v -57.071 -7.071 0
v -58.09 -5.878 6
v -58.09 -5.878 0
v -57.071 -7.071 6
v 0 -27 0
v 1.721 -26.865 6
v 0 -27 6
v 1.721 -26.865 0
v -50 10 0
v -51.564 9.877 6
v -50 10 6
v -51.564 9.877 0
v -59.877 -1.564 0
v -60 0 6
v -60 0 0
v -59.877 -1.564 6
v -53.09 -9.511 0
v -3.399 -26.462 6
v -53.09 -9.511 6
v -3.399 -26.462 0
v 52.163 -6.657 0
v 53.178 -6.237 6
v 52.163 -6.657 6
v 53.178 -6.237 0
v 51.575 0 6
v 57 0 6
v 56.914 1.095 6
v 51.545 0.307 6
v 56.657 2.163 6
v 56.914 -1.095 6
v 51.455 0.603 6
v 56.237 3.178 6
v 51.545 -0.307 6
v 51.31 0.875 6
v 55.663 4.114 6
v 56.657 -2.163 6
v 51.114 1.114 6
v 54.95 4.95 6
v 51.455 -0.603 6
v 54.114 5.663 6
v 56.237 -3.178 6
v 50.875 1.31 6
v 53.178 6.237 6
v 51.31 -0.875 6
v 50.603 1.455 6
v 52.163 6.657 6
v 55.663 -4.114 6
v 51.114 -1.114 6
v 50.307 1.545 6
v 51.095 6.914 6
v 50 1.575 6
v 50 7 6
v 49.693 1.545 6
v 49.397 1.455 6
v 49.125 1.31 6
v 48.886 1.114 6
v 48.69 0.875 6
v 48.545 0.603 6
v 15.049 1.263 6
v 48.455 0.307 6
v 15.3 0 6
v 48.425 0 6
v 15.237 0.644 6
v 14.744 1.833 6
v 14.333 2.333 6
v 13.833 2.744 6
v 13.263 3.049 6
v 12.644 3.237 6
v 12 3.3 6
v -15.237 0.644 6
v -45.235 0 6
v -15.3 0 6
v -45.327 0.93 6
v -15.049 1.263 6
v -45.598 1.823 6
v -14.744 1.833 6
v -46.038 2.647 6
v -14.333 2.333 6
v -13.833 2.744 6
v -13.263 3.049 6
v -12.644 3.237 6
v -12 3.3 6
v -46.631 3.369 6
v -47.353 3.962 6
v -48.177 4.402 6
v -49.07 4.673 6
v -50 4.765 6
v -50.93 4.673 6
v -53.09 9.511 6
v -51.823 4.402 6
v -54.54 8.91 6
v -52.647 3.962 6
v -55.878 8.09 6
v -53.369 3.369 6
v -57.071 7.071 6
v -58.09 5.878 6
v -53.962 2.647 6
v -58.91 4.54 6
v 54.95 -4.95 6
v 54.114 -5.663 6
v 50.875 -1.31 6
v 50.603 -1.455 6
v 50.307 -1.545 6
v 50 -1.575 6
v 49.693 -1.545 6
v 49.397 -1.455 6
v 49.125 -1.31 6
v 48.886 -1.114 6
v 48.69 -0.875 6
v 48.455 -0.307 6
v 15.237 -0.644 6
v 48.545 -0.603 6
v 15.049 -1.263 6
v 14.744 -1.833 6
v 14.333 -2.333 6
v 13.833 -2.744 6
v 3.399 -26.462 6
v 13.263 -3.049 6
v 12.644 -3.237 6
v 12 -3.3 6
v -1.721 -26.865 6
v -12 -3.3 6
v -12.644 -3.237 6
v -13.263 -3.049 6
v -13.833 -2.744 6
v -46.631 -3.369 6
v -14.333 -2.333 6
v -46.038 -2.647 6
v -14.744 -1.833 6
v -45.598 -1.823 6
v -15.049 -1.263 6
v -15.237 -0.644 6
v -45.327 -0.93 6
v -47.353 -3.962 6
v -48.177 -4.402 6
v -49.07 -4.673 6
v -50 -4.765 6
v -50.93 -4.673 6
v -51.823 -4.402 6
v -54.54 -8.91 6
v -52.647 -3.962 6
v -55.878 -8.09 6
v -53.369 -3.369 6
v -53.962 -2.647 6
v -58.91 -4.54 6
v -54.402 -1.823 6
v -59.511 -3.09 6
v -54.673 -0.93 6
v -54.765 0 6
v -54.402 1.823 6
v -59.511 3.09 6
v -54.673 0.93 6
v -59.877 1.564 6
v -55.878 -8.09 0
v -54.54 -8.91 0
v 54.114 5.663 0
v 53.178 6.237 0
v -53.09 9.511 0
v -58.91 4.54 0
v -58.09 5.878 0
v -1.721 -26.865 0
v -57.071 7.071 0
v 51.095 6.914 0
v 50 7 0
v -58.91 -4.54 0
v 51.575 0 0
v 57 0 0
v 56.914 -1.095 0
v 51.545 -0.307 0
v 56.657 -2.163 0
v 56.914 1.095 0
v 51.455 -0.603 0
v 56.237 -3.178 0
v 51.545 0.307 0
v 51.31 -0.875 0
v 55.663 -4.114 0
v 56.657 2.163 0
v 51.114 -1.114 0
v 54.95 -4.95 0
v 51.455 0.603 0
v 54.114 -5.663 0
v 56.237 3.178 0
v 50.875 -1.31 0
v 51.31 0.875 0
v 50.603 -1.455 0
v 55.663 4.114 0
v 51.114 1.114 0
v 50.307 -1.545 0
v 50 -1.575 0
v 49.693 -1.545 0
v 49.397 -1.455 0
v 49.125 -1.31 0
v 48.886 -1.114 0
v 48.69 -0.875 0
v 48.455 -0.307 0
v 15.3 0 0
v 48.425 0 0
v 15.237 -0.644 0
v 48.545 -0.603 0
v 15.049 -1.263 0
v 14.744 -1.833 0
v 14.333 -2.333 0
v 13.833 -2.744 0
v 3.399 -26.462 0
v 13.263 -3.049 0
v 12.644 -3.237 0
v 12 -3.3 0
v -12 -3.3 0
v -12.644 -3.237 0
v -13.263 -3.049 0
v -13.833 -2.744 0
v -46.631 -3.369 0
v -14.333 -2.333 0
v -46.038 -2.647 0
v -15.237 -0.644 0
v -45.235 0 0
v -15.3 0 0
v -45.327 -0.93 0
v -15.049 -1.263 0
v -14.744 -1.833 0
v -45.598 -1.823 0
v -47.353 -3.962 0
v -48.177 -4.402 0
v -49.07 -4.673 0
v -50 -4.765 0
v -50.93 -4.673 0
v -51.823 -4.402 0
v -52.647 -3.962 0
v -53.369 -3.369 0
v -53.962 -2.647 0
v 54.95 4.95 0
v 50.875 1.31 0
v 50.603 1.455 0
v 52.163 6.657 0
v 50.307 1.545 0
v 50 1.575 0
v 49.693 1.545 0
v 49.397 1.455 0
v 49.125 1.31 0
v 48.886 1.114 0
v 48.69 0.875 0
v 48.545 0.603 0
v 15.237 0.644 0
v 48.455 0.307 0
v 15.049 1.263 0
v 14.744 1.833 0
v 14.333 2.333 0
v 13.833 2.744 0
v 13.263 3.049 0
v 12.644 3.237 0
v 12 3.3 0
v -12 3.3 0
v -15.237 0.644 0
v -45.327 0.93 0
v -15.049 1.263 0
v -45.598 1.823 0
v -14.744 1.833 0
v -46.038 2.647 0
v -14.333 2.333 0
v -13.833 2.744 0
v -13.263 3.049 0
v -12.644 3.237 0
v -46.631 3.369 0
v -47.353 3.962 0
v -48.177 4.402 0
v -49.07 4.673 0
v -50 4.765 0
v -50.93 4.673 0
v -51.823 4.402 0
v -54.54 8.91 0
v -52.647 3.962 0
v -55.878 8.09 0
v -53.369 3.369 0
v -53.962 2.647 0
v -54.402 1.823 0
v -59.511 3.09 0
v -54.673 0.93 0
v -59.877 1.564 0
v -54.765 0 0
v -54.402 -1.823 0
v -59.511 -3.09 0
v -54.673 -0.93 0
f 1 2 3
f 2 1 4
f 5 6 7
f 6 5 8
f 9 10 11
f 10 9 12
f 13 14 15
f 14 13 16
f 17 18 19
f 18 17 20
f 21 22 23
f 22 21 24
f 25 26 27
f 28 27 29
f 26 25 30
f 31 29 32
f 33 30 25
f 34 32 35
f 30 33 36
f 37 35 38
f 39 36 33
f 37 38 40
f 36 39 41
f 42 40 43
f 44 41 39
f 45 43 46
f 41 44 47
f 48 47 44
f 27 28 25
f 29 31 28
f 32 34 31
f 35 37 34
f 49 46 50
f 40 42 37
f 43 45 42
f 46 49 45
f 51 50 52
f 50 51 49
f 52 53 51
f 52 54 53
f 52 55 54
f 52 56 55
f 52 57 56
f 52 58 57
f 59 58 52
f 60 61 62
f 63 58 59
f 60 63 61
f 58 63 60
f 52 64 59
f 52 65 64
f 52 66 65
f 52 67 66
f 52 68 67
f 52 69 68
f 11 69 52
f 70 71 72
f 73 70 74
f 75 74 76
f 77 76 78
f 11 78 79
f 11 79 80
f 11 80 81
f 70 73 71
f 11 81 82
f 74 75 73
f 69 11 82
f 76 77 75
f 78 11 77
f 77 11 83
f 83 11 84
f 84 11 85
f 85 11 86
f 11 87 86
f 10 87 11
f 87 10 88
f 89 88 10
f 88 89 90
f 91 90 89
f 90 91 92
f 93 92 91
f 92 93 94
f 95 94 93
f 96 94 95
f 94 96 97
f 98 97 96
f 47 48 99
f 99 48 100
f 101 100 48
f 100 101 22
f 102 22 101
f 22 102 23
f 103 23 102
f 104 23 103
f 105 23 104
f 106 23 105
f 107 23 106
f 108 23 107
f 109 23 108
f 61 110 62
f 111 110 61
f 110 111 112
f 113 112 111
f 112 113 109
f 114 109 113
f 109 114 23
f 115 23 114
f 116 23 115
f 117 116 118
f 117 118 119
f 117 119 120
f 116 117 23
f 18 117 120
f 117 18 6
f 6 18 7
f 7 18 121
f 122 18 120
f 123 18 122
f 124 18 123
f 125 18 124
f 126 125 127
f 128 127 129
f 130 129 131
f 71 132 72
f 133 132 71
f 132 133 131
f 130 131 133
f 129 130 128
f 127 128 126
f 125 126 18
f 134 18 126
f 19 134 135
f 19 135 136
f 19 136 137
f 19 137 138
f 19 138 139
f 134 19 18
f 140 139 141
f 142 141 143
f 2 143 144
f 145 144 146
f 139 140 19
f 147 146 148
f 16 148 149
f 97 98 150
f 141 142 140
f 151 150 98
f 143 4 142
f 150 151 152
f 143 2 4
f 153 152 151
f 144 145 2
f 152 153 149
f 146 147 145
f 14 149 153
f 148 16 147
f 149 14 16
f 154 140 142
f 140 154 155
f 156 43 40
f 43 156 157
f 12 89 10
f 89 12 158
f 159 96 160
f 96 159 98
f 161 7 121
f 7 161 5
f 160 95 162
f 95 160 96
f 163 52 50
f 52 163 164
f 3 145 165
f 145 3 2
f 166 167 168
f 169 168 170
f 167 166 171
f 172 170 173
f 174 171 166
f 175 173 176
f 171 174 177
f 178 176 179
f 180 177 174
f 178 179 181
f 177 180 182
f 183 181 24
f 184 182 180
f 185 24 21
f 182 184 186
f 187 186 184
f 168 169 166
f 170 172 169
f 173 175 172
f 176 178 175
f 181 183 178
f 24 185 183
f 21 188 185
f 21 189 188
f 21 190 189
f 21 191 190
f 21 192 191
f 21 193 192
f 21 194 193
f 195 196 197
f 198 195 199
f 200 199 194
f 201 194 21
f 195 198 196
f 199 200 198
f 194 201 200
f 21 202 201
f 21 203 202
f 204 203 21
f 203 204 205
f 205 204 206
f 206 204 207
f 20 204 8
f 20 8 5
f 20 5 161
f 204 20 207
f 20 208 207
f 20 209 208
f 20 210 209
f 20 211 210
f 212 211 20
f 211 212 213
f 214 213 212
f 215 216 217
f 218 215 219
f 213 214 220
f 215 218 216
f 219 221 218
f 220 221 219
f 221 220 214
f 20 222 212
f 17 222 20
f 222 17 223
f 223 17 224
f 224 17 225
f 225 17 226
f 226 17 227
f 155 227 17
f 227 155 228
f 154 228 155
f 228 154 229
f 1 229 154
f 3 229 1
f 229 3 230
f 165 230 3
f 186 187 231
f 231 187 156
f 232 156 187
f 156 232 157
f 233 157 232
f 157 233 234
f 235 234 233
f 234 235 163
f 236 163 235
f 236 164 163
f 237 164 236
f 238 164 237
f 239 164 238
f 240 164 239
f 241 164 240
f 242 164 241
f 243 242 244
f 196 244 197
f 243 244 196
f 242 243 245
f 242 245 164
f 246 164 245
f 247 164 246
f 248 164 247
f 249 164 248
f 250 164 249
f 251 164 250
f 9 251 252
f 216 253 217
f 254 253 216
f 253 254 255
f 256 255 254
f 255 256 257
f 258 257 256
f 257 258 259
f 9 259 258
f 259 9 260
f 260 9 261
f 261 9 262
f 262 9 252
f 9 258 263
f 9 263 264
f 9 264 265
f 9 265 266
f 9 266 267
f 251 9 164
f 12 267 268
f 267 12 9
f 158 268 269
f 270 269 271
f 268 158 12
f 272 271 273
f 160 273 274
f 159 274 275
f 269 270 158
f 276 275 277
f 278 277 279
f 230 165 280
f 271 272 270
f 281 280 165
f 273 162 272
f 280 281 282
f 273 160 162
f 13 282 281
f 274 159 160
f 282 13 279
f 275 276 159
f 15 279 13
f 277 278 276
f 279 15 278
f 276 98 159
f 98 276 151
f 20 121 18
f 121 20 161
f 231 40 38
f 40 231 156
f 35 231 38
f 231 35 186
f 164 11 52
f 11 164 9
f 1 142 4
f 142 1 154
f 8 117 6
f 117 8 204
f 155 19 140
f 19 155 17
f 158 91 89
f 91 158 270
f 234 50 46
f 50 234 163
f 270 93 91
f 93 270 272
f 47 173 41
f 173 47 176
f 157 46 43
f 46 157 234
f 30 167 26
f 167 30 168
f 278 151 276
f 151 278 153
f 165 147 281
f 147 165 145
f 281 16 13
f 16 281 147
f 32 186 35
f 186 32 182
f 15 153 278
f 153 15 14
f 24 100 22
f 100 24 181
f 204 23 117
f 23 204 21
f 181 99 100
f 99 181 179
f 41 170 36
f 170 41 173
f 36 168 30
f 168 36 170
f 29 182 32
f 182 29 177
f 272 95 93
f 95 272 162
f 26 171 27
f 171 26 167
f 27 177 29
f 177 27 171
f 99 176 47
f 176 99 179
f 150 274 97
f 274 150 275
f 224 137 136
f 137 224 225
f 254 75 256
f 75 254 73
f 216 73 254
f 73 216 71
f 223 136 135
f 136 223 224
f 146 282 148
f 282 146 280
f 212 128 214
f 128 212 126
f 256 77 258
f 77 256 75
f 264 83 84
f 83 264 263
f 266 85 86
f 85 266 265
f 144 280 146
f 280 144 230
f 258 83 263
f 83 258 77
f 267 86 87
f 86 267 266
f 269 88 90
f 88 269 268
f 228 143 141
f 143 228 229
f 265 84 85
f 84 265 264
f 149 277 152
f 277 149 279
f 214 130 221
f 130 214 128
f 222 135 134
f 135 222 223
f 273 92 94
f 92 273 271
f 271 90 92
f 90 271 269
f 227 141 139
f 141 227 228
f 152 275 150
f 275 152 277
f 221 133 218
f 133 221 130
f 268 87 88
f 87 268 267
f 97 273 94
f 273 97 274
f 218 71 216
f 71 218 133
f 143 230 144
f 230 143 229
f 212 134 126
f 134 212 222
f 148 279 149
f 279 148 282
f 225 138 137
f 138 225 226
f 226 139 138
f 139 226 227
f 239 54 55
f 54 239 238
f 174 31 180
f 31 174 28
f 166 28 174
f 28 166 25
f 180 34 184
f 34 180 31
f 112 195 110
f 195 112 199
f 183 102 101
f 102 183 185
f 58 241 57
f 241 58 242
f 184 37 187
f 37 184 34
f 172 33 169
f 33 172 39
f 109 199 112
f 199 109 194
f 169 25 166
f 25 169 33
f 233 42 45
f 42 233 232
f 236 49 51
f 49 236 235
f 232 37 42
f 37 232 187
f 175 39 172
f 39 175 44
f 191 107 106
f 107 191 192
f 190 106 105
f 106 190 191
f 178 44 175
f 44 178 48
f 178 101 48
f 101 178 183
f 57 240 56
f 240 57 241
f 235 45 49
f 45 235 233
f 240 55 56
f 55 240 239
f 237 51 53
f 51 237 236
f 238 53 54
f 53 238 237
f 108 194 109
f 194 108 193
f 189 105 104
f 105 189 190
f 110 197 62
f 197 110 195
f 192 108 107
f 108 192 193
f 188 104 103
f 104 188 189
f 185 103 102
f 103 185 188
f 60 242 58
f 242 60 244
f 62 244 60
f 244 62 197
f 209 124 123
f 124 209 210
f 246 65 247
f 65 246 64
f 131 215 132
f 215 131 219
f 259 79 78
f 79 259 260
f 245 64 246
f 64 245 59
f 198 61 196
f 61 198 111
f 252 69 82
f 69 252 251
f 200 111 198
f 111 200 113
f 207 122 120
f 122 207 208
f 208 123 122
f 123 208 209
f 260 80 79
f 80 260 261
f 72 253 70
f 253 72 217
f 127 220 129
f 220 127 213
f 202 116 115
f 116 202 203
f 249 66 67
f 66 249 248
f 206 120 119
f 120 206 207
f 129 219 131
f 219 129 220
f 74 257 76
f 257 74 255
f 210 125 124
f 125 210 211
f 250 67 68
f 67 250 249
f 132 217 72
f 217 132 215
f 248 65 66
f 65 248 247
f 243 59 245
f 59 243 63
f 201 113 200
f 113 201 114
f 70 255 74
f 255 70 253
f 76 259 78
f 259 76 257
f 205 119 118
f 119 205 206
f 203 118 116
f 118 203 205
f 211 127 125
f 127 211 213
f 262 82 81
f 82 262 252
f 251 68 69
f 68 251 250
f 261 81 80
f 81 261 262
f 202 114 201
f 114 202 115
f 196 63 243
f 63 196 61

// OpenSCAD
$fn = 32;

// ----------------------------------------------------------------------
// Lever: 100 mm between the bosses, 6 mm thick, smooth outline
// ----------------------------------------------------------------------

// --- parameters (mm) ---
lever_l = 100;            // distance between the boss centres
boss_a = 20;              // first boss diameter
boss_b = 14;              // second boss diameter
bore_a = 9.53;            // first bore
bore_b = 3.15;            // second bore
lever_t = 6;              // lever thickness
boss_c = 22;              // middle boss diameter
bend = 16;                // how far the middle boss drops
slot_w = 6.6;             // adjustment slot width

lever_profile = [[-60, 0], [-59.877, -1.564], [-59.511, -3.09], [-58.91, -4.54], [-58.09, -5.878], [-57.071, -7.071], [-55.878, -8.09], [-54.54, -8.91], [-53.09, -9.511], [-3.399, -26.462], [-1.721, -26.865], [0, -27], [1.721, -26.865], [3.399, -26.462], [52.163, -6.657], [53.178, -6.237], [54.114, -5.663], [54.95, -4.95], [55.663, -4.114], [56.237, -3.178], [56.657, -2.163], [56.914, -1.095], [57, 0], [56.914, 1.095], [56.657, 2.163], [56.237, 3.178], [55.663, 4.114], [54.95, 4.95], [54.114, 5.663], [53.178, 6.237], [52.163, 6.657], [51.095, 6.914], [50, 7], [-50, 10], [-51.564, 9.877], [-53.09, 9.511], [-54.54, 8.91], [-55.878, 8.09], [-57.071, 7.071], [-58.09, 5.878], [-58.91, 4.54], [-59.511, 3.09], [-59.877, 1.564]];

difference() {
  linear_extrude(height = lever_t) polygon(lever_profile);
  translate([-50, 0, -2.5]) cylinder(h = lever_t + 5, d = bore_a);
  translate([50, 0, -2.5]) cylinder(h = lever_t + 5, d = bore_b);
  /* slotted adjustment, stadium shaped */
  hull() {
    translate([-12, 0, -2.5]) cylinder(h = lever_t + 5, d = slot_w);
    translate([12, 0, -2.5]) cylinder(h = lever_t + 5, d = slot_w);
  }
}
